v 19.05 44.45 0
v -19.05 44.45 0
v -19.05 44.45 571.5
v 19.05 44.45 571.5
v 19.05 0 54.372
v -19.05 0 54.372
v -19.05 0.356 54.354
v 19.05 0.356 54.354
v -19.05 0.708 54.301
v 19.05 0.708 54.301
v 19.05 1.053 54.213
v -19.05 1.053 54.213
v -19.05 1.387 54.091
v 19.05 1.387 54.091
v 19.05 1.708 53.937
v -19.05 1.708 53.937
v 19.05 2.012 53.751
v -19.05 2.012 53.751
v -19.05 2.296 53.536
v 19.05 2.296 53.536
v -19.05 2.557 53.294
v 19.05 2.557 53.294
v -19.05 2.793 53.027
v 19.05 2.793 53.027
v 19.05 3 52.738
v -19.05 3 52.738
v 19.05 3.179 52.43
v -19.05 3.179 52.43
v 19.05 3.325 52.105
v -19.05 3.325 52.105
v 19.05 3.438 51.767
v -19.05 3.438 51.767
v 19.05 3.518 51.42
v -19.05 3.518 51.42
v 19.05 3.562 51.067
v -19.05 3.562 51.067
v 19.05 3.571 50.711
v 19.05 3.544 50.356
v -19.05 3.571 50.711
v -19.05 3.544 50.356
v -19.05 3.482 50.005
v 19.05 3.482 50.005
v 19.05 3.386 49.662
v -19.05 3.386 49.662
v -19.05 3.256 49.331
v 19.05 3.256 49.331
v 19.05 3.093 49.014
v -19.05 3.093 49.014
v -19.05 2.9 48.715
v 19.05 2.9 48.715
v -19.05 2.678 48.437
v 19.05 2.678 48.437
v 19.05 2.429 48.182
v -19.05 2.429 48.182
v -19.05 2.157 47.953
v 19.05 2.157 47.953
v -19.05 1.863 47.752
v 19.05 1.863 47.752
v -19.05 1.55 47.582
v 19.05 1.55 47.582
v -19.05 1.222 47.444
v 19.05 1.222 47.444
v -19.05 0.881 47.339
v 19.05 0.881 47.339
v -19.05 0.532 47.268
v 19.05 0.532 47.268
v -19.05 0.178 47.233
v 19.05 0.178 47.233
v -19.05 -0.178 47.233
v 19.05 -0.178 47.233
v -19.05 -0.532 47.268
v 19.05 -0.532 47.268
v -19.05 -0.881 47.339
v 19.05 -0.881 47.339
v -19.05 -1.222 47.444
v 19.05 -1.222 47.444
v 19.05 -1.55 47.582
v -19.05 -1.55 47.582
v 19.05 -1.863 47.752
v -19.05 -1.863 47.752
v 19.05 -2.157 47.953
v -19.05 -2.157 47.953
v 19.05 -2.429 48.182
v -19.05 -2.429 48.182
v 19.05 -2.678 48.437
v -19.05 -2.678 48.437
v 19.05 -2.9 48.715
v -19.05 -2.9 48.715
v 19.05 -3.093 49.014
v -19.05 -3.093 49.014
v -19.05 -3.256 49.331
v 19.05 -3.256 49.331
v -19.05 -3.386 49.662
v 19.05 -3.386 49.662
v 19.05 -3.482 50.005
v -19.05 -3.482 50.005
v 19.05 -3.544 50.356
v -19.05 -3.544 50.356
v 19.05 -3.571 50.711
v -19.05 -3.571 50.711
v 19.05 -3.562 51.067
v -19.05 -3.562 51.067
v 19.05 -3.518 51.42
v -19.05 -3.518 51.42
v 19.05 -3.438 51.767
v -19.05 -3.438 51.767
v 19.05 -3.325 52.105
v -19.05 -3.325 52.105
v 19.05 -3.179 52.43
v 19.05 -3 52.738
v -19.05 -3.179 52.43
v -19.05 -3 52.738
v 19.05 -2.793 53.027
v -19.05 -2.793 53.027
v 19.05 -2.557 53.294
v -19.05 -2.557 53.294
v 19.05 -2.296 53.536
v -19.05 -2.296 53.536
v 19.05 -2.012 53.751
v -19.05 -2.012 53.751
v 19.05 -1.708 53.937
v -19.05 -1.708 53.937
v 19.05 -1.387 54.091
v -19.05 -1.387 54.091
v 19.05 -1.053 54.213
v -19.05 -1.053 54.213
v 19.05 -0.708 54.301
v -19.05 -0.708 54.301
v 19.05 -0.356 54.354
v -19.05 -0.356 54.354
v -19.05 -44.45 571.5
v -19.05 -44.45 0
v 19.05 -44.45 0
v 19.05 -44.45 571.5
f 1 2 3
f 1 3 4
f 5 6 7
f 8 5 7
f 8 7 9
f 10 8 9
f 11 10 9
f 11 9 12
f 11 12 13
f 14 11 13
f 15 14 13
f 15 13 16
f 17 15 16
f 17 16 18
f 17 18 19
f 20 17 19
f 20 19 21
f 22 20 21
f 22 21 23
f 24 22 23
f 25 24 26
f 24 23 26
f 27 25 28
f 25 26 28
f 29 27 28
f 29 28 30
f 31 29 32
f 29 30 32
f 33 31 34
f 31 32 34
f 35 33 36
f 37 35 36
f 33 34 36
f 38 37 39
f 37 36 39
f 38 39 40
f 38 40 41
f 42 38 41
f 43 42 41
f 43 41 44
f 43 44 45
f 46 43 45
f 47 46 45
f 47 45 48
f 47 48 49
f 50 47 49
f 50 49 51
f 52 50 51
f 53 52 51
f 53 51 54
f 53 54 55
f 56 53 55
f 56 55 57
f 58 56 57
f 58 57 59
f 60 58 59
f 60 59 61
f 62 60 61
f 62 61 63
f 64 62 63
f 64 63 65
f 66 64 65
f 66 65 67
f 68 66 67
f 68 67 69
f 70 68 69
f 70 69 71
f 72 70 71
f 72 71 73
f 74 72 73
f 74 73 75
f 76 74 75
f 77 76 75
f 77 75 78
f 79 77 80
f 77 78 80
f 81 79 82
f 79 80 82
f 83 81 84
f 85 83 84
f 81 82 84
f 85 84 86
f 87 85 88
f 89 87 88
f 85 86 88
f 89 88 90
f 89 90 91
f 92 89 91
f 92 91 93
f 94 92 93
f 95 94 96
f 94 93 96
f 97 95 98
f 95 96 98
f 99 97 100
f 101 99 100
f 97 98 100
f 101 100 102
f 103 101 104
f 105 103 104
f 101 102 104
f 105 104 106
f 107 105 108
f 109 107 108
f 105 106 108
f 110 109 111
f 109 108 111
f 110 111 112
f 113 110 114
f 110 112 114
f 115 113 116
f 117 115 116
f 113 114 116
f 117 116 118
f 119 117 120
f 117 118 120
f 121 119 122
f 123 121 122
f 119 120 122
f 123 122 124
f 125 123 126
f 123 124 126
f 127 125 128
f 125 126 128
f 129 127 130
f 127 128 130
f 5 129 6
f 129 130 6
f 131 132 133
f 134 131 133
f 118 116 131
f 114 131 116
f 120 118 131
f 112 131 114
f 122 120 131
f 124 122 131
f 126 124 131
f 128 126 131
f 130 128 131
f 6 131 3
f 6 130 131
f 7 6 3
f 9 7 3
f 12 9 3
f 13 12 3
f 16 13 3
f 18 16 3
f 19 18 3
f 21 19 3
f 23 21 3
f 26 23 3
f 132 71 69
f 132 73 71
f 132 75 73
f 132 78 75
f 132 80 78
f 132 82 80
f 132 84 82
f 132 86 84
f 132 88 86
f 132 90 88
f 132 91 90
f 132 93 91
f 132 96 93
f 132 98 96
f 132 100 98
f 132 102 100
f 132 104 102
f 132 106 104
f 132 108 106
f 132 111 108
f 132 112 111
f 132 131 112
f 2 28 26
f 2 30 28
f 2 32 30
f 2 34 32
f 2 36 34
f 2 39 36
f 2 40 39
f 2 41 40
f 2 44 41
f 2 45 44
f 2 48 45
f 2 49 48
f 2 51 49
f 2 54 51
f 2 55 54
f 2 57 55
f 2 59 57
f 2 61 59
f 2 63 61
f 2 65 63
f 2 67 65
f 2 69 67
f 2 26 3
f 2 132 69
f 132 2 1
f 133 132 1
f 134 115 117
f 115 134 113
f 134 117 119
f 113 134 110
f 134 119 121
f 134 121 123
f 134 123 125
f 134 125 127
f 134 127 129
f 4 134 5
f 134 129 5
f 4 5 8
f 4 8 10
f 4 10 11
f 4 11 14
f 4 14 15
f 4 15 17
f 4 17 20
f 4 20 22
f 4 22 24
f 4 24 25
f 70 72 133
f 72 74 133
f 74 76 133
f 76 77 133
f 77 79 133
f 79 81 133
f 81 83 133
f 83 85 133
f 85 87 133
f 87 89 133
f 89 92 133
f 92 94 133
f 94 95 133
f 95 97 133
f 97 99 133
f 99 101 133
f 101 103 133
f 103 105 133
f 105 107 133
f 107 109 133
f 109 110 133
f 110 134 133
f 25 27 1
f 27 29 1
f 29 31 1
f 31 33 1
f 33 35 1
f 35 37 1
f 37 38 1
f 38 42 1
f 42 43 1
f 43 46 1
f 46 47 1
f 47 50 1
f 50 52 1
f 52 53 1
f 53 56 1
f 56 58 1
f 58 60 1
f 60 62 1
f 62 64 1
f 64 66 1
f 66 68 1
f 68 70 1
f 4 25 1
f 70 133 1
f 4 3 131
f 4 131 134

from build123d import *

# Parameters (mm, degrees)
SKETCH1_W                       = 38.1
SKETCH1_H                       = 88.9
BOSS_EXTRUDE1_DEPTH             = 571.5
F_9_32_0_28125_DIAMETER_HOLE1_D = 7.14375


with BuildPart() as part:
    # Sketch1 → Boss-Extrude1 (new body)
    with BuildSketch(Plane.XY):
        Rectangle(SKETCH1_W, SKETCH1_H)
    extrude(amount=BOSS_EXTRUDE1_DEPTH)

    # 9/32 (0.28125) Diameter Hole1 (through all)
    with Locations(Plane(origin=(19.05, 0, 0), x_dir=(0, 0, -1), z_dir=(1, 0, 0))):
        with Locations((-50.8, 0)):
            Hole(F_9_32_0_28125_DIAMETER_HOLE1_D / 2)


solid = part.part
